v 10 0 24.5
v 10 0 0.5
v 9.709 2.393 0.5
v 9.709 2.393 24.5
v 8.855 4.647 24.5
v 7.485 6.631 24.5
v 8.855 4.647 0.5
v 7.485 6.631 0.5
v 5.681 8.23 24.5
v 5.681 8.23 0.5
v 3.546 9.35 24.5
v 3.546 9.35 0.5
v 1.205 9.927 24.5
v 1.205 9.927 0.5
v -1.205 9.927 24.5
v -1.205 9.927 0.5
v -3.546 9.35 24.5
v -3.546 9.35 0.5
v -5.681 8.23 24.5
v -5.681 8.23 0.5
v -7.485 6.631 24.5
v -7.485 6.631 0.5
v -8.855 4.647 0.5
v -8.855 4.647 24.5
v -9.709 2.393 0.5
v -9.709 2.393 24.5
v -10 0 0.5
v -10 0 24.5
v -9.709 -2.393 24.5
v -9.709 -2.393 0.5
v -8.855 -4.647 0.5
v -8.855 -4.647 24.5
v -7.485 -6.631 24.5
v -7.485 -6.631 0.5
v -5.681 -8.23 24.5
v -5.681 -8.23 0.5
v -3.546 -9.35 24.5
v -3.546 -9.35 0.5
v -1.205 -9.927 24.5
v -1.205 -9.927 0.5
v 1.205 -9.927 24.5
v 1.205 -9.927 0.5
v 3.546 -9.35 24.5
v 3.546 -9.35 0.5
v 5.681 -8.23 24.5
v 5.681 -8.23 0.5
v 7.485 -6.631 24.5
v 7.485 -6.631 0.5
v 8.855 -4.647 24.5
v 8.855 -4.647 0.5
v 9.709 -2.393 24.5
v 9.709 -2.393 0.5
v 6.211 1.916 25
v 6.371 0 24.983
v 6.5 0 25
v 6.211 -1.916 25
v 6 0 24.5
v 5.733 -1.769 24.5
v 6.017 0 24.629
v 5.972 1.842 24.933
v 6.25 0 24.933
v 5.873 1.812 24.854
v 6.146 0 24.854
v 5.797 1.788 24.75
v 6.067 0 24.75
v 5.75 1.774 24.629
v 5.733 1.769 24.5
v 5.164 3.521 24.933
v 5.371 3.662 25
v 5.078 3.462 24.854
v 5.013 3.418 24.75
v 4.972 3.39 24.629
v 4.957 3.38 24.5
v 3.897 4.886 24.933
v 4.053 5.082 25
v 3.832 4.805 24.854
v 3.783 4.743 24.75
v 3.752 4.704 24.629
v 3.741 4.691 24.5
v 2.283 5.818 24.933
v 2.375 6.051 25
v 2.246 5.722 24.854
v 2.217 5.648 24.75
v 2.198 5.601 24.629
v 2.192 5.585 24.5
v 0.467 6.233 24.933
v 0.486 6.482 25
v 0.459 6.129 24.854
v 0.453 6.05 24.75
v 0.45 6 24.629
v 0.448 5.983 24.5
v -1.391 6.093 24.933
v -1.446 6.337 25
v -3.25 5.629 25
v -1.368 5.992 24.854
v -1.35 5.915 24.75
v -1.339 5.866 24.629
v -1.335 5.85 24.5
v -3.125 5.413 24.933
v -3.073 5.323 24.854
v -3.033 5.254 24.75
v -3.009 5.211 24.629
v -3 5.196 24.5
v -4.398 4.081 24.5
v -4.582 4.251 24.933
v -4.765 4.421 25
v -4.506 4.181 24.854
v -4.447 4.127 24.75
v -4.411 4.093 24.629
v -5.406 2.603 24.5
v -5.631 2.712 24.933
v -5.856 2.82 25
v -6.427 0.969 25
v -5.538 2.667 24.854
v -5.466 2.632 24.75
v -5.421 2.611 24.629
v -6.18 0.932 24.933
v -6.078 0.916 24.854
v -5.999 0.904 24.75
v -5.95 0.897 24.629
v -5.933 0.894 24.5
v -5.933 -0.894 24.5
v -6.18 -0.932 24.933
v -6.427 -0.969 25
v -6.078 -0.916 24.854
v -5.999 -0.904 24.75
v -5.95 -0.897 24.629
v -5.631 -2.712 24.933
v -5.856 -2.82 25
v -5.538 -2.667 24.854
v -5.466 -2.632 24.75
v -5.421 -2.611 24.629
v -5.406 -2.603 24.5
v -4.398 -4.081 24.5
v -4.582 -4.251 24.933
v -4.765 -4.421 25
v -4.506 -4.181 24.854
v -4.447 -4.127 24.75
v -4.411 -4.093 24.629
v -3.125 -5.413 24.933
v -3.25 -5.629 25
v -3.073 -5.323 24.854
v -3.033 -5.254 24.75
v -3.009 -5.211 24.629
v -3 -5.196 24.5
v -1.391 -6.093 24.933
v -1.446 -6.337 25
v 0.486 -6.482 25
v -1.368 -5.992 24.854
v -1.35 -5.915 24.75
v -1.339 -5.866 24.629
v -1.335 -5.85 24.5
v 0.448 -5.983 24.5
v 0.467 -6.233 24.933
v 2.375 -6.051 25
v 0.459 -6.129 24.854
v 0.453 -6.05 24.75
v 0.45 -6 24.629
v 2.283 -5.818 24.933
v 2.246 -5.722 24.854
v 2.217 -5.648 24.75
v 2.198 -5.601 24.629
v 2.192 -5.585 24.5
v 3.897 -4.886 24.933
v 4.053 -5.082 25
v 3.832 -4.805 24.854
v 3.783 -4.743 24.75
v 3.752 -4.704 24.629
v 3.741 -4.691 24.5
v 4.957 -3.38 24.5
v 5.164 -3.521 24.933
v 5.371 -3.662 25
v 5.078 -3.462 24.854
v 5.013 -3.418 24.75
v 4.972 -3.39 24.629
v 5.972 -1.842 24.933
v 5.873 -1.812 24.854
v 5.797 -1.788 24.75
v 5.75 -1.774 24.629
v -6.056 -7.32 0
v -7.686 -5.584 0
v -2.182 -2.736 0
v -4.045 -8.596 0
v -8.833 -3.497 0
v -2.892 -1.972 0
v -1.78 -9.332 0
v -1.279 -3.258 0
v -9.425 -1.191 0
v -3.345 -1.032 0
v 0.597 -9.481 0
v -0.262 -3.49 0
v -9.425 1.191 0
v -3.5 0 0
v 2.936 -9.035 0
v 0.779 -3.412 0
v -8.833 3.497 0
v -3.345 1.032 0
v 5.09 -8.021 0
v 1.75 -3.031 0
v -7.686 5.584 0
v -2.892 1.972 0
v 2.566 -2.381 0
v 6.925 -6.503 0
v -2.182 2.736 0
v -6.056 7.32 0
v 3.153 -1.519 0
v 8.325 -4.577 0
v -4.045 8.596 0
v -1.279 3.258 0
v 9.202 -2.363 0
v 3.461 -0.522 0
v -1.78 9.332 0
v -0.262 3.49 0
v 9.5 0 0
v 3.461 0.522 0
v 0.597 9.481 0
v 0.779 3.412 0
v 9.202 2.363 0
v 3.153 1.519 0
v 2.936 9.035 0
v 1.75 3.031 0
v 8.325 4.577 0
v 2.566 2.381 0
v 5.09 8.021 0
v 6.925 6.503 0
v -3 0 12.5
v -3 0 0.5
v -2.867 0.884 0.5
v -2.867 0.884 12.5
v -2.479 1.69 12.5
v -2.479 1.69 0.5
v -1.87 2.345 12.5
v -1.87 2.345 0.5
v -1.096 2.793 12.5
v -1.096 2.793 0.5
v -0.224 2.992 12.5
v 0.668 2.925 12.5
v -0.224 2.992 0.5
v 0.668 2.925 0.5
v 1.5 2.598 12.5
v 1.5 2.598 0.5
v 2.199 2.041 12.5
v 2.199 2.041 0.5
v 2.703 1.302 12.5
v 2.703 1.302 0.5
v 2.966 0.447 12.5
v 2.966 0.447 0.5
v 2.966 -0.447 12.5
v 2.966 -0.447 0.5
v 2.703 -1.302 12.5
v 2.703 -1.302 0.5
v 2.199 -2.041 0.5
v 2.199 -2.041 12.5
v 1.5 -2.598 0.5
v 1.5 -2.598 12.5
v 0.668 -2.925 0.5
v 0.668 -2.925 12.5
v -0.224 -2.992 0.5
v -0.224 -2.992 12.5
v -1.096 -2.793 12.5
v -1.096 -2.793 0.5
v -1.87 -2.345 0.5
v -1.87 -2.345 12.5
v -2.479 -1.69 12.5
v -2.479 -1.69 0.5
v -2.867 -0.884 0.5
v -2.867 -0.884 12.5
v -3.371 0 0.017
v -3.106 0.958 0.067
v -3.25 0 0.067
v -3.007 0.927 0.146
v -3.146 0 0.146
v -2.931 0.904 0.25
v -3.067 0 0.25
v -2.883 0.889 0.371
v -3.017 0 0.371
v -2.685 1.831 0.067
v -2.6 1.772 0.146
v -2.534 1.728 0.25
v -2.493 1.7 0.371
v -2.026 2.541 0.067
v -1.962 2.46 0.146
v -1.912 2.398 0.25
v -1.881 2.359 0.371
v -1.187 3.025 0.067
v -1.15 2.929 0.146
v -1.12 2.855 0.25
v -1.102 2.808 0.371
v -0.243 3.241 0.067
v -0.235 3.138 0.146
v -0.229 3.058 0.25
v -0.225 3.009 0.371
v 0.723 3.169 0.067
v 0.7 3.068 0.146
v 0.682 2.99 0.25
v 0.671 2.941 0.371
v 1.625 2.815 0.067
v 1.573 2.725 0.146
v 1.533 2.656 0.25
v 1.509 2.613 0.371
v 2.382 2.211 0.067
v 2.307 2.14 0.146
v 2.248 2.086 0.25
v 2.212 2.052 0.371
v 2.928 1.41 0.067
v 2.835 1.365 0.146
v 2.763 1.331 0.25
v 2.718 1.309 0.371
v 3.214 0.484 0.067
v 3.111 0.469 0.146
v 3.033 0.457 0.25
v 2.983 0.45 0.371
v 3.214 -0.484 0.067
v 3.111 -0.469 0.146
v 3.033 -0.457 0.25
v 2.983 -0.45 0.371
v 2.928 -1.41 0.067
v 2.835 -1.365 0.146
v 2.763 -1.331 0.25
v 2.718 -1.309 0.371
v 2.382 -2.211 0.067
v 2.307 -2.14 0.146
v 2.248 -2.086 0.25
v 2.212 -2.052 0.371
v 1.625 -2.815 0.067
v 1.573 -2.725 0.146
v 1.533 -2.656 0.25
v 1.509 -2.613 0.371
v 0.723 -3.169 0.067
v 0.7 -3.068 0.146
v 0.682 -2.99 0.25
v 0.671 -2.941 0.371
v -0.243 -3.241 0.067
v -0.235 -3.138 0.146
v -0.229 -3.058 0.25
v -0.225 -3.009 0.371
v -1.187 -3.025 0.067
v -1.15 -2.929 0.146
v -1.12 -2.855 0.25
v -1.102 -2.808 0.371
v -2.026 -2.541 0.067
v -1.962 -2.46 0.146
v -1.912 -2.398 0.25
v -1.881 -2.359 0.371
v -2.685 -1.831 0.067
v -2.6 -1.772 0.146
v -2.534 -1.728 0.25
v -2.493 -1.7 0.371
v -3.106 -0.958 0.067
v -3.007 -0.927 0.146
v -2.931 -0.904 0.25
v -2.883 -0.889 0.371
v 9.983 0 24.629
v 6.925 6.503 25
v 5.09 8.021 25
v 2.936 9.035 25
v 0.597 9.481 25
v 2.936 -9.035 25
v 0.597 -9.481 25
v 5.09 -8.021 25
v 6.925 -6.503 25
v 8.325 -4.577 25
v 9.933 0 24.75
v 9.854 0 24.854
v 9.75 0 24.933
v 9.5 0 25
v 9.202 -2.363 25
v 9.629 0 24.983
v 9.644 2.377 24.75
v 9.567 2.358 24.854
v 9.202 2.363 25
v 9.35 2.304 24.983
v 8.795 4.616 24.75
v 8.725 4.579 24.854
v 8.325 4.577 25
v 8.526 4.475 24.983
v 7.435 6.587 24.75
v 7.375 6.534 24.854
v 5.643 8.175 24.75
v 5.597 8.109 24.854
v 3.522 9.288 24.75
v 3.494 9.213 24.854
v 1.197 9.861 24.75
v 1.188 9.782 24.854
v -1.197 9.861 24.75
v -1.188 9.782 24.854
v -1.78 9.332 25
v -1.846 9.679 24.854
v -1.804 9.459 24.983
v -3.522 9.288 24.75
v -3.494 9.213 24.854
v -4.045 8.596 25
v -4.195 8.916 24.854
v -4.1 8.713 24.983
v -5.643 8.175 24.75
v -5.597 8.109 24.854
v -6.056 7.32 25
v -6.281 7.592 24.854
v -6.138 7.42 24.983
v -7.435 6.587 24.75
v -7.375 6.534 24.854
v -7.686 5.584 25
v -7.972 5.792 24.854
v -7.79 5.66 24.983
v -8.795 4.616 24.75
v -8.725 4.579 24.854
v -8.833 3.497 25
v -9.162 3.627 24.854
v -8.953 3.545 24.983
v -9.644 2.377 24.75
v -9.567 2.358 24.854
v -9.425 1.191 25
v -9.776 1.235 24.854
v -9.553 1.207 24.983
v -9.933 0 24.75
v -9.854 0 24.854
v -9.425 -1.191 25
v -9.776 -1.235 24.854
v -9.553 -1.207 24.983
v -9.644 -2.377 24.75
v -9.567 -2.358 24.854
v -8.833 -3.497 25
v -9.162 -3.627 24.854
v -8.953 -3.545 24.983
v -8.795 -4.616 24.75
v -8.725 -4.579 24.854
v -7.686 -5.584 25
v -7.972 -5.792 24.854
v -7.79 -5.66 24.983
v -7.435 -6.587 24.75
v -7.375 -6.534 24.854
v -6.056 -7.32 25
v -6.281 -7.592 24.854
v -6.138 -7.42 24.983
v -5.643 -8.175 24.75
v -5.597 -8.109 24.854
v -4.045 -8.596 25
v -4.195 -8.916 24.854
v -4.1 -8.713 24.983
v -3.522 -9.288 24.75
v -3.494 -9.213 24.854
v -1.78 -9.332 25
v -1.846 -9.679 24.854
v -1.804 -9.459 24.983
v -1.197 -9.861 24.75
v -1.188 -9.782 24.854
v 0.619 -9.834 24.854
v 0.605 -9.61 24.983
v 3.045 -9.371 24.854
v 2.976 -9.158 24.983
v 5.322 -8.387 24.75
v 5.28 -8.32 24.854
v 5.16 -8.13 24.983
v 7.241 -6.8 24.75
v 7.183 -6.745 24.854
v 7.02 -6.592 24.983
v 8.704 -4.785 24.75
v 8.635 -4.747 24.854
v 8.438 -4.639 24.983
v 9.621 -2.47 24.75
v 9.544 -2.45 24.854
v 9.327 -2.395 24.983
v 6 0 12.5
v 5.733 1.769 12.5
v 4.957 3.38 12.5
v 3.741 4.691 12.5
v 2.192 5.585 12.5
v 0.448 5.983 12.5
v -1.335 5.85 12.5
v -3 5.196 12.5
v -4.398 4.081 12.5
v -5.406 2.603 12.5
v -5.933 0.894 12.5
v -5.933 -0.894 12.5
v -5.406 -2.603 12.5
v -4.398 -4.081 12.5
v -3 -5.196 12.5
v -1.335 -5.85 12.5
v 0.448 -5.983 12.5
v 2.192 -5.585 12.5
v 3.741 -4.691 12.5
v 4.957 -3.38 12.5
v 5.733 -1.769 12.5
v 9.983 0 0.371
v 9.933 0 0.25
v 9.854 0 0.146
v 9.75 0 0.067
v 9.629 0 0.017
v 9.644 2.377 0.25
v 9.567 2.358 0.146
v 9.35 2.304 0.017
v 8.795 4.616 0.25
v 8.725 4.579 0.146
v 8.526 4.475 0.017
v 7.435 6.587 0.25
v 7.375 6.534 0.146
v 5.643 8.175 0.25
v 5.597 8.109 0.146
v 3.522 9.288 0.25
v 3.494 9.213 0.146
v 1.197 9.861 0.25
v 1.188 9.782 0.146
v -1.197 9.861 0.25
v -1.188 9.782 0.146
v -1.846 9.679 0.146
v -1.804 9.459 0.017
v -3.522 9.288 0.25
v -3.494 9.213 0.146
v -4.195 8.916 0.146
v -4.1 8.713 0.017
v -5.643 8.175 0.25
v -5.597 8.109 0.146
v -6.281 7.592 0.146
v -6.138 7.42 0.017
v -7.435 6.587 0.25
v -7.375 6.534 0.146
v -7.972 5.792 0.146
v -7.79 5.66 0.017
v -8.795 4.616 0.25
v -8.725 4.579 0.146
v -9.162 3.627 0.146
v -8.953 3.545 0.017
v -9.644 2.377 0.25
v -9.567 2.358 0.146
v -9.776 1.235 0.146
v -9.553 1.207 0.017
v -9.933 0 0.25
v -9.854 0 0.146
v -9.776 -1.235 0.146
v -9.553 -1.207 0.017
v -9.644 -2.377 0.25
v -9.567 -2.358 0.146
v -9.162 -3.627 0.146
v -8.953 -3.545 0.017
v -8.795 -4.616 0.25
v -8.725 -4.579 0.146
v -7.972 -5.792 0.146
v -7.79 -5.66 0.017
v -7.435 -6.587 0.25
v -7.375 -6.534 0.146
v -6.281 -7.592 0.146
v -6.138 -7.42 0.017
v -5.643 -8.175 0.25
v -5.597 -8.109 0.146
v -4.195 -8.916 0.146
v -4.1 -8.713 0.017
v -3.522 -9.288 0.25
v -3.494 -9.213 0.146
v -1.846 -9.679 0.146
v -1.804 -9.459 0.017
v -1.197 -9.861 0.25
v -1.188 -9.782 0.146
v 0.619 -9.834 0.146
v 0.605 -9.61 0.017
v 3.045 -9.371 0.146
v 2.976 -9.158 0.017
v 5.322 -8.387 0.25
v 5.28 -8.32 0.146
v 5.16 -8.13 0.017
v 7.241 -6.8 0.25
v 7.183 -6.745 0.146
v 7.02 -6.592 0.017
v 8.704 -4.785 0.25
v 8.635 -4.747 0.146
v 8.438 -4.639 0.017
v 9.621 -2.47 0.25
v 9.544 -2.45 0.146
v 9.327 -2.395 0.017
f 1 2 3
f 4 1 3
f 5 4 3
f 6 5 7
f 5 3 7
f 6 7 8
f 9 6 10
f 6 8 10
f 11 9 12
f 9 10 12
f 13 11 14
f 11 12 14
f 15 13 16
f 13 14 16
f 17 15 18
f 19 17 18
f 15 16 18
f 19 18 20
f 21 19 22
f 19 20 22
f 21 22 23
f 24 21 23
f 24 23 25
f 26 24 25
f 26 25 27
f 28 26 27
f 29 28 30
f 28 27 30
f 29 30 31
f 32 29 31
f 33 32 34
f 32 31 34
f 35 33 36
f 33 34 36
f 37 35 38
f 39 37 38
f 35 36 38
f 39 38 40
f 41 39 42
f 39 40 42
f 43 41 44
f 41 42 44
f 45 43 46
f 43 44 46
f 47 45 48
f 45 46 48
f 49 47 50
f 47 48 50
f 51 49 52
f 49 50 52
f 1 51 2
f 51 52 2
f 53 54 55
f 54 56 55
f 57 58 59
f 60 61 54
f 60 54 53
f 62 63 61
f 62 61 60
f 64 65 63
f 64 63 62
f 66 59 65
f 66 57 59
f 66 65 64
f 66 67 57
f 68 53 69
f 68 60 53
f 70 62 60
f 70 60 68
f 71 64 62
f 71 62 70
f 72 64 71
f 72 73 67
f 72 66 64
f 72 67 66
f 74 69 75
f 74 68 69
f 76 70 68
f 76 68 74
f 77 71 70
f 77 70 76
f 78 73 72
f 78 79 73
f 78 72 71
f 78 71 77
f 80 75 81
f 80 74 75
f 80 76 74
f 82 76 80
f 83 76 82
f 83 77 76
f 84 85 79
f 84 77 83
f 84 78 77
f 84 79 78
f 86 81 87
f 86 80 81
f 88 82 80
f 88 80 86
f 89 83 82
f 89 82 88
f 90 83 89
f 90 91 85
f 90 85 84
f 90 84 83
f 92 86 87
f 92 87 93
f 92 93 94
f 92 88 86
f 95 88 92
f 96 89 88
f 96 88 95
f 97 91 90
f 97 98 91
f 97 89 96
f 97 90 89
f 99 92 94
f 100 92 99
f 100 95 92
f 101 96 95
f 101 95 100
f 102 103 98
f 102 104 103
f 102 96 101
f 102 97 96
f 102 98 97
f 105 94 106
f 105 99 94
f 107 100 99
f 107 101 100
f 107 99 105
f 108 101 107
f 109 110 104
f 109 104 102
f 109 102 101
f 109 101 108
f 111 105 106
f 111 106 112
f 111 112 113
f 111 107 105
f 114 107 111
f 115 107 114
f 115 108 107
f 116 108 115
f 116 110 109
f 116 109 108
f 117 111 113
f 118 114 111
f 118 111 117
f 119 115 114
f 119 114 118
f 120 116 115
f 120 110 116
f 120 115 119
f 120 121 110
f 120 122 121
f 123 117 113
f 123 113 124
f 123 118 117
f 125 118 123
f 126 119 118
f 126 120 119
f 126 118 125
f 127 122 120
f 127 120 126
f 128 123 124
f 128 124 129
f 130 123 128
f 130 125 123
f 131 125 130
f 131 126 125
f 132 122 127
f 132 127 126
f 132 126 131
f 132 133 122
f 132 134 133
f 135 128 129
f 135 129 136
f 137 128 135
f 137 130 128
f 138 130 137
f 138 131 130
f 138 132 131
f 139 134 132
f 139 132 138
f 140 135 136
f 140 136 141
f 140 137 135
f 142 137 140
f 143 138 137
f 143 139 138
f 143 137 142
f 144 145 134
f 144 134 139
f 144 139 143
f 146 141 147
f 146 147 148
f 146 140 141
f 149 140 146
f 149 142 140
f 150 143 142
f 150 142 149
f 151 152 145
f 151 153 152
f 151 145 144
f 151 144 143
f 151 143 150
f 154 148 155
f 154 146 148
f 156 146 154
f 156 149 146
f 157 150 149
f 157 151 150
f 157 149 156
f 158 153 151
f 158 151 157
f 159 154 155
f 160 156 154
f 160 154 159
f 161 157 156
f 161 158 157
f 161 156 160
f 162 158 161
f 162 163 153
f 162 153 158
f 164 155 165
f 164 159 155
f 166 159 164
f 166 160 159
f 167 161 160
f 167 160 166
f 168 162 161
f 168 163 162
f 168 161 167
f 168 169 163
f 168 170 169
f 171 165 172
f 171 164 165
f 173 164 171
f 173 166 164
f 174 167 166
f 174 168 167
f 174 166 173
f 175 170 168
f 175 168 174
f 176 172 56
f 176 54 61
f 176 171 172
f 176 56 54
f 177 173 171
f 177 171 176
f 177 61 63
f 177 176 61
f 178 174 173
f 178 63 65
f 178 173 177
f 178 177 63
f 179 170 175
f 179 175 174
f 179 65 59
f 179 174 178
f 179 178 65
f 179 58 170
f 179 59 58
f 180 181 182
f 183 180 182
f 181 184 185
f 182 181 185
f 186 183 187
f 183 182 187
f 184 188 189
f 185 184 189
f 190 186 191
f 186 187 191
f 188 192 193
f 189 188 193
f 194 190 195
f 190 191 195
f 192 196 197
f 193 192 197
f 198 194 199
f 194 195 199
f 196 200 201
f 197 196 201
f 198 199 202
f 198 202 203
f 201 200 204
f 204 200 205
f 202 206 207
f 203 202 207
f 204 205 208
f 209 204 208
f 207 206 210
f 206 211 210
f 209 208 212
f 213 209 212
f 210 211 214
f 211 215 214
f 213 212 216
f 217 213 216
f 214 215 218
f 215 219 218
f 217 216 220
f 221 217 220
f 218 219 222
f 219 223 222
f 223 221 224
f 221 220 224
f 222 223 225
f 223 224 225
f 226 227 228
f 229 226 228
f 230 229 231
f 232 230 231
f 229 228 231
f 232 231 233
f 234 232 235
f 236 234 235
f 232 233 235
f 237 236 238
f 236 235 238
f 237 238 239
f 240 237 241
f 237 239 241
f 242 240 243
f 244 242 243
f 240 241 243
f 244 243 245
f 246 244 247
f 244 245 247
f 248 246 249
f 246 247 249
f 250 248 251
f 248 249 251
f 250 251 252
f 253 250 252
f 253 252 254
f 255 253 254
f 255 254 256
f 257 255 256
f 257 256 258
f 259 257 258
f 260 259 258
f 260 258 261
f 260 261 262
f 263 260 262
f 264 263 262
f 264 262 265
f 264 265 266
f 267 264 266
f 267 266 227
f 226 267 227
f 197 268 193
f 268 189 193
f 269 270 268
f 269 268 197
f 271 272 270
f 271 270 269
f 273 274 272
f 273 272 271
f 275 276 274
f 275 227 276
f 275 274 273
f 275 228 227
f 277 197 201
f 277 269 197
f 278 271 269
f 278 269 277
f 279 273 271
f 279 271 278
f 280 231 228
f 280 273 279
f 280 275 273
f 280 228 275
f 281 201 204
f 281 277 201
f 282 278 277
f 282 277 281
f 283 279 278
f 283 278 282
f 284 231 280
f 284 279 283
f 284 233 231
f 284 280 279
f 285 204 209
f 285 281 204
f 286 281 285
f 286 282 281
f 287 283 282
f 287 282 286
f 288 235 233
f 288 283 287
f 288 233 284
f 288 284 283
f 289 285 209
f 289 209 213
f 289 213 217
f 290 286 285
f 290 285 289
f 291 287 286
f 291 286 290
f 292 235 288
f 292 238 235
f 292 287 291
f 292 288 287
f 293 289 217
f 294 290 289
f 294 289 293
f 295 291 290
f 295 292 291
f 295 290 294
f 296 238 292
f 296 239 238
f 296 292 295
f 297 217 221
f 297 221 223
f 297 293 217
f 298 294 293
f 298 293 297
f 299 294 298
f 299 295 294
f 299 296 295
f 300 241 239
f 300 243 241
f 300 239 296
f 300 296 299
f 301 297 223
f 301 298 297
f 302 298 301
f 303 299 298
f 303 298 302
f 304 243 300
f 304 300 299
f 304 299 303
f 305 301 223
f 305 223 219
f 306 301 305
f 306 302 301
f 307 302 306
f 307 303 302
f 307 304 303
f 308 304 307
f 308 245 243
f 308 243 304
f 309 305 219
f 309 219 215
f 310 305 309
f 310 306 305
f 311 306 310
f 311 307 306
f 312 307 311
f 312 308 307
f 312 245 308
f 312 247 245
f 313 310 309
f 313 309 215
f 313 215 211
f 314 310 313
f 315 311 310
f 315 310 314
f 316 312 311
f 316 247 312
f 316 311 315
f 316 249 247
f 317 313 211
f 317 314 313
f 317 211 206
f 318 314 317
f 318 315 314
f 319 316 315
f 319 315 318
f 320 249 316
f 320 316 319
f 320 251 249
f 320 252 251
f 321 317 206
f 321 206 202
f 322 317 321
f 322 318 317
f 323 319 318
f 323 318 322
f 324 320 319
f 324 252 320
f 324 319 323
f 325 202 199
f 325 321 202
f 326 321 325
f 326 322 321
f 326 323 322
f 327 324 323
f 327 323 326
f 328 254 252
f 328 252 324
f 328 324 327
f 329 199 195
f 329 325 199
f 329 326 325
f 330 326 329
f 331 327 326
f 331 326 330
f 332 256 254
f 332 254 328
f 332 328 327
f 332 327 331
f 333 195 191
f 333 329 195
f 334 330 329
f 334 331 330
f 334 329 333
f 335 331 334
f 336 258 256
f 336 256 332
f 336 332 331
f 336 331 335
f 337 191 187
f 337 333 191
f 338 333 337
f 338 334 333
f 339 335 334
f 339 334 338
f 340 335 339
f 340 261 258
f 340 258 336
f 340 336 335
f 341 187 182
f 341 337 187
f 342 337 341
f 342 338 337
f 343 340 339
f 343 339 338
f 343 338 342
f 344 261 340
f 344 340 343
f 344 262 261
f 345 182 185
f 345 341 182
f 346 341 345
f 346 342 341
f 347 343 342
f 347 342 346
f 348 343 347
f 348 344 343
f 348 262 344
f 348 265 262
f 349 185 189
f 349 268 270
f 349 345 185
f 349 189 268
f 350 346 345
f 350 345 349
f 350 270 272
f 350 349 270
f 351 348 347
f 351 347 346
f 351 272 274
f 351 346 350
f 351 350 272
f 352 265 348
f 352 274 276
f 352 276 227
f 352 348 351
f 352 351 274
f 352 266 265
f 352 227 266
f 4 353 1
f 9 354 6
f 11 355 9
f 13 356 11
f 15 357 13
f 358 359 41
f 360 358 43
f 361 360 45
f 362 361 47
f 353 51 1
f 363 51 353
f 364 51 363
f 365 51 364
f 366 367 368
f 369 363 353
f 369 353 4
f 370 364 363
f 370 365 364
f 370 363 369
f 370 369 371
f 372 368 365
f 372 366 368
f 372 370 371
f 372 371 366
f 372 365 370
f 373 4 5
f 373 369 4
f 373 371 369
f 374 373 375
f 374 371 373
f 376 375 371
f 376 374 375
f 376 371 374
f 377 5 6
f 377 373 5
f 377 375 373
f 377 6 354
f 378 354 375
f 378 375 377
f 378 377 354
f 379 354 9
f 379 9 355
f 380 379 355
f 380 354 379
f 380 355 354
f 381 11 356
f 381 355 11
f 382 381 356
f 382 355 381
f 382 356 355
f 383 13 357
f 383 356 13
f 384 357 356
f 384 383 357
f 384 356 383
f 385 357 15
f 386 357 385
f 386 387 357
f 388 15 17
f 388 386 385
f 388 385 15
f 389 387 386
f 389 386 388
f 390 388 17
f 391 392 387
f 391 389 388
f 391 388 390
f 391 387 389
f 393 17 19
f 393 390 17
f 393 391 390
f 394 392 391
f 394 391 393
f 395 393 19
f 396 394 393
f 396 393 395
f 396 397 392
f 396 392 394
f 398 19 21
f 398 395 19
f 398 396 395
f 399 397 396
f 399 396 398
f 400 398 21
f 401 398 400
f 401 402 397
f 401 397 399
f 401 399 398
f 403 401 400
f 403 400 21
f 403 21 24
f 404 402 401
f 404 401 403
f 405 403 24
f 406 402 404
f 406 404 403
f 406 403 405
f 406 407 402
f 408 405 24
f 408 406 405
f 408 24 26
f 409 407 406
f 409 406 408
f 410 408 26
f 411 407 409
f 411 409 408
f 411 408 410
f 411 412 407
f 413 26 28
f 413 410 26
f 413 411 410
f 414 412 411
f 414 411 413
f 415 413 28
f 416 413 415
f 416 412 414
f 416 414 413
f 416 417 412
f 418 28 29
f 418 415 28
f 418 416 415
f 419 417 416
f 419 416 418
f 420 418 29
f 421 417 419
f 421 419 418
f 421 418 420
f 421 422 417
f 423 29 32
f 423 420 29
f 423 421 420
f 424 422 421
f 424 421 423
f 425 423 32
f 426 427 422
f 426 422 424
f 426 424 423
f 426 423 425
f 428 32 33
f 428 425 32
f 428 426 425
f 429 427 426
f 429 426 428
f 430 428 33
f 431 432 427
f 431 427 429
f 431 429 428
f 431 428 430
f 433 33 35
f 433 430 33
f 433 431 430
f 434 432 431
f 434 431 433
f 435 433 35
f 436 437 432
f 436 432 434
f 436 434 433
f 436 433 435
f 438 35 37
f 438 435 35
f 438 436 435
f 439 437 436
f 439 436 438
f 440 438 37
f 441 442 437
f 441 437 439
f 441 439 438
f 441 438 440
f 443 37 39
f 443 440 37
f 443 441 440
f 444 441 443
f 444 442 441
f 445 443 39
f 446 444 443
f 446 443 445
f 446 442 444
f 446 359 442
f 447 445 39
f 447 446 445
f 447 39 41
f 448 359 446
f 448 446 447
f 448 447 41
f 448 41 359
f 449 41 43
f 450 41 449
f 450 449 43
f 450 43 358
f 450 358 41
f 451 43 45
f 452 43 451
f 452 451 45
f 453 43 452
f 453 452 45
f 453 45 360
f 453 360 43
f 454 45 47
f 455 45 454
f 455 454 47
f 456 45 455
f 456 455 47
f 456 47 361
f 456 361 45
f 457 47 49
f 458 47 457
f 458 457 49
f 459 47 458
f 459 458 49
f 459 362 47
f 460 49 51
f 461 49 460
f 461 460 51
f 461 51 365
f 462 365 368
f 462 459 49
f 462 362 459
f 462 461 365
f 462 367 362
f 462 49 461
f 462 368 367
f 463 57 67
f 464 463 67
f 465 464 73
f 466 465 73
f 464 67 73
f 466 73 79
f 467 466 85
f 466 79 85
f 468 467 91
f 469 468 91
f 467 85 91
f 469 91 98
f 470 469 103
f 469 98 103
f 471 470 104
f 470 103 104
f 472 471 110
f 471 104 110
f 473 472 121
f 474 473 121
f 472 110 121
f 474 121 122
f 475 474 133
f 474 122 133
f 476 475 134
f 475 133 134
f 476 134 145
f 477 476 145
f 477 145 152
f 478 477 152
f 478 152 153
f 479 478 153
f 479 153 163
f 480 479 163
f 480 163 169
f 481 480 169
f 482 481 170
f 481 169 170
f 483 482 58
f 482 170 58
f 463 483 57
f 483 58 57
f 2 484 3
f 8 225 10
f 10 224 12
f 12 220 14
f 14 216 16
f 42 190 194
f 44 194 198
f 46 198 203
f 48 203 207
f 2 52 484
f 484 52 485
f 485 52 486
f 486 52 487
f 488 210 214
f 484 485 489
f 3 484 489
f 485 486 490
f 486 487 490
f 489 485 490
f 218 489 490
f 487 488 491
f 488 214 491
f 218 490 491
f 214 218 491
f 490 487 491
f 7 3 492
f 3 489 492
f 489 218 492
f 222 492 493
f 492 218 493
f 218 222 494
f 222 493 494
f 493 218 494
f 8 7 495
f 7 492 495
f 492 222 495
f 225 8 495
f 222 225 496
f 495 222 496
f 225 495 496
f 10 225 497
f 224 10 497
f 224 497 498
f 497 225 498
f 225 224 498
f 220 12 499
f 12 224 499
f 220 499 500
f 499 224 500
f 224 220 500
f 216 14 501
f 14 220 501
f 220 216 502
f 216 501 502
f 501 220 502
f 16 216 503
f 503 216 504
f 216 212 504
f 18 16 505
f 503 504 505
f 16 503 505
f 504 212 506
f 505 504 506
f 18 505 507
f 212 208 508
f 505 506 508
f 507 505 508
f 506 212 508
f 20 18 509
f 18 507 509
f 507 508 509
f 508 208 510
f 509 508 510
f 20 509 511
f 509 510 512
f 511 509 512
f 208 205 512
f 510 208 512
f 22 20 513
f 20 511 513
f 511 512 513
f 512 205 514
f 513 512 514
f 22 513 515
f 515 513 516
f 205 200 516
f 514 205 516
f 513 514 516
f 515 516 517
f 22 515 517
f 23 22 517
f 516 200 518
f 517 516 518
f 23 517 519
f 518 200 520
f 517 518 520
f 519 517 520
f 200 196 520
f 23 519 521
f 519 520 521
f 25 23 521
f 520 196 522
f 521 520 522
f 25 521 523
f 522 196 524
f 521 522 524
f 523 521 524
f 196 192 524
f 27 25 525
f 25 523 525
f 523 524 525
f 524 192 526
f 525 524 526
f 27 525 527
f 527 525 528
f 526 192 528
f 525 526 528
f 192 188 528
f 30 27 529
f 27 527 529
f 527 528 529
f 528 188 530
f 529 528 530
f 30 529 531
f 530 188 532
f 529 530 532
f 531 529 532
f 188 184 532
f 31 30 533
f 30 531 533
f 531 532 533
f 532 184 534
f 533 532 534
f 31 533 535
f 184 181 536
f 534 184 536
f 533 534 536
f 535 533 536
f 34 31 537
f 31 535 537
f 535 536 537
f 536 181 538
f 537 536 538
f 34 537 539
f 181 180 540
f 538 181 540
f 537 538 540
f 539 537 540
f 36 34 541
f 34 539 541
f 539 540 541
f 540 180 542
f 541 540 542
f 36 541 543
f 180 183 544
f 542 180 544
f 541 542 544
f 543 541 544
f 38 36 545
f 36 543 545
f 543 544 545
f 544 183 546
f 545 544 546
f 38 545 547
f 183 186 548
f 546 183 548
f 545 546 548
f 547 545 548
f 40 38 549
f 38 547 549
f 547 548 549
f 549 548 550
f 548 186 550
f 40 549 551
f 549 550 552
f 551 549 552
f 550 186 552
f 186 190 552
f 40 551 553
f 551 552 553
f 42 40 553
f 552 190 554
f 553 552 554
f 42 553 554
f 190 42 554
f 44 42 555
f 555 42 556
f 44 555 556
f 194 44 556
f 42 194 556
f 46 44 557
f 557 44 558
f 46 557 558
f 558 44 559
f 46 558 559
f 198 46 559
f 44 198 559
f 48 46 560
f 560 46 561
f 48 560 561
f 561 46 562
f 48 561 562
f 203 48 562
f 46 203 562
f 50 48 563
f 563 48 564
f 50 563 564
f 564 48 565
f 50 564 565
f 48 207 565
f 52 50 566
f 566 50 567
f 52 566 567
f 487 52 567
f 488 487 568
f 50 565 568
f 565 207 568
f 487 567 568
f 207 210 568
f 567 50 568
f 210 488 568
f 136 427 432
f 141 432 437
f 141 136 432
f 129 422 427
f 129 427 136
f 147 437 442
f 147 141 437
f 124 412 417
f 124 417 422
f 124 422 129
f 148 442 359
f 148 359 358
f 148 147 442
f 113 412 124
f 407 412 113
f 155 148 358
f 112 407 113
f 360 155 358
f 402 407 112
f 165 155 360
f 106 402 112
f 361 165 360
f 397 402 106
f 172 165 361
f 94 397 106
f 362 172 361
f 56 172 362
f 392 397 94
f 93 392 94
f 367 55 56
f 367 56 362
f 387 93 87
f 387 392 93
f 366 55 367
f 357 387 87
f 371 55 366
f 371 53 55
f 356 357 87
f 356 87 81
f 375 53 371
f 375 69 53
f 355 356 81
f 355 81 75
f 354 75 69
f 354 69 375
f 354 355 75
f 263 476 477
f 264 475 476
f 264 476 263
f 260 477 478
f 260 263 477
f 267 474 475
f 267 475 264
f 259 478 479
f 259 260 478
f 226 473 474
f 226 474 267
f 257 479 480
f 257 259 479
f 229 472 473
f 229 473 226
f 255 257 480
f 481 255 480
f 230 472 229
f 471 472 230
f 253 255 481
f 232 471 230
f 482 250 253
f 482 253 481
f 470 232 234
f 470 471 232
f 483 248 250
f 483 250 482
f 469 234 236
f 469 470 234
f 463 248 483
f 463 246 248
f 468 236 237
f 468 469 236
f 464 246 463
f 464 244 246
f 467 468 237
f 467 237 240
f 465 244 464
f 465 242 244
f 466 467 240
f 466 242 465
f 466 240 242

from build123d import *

# Parameters (mm, degrees)
SKETCH_1_R          = 10
EXTRUDE_1_DEPTH     = 25
SKETCH_2_R          = 6
CUT_EXTRUDE_1_DEPTH = 12.5
SKETCH_3_R          = 3
CUT_EXTRUDE_2_DEPTH = 15
FILLET_1_R          = 0.5


with BuildPart() as part:
    # 草图1 → 凸台-拉伸1 (new body)
    with BuildSketch(Plane.XY):
        Circle(SKETCH_1_R)
    extrude(amount=EXTRUDE_1_DEPTH)

    # 草图2 → 切除-拉伸1 (cut)
    with BuildSketch(Plane.XY.offset(25)):
        Circle(SKETCH_2_R)
    extrude(amount=-CUT_EXTRUDE_1_DEPTH, mode=Mode.SUBTRACT)

    # 草图3 → 切除-拉伸2 (cut)
    with BuildSketch(Plane(origin=(0, 0, 0), x_dir=(-1, 0, 0), z_dir=(0, 0, -1))):
        Circle(SKETCH_3_R)
    extrude(amount=-CUT_EXTRUDE_2_DEPTH, mode=Mode.SUBTRACT)

    # 圆角1
    fillet_1_edges = [part.edges().sort_by_distance(p)[0] for p in [
        (3, 0, 0),
        (-10, 0, 0),
        (-10, 0, 25),
        (-6, 0, 25),
    ]]
    fillet(fillet_1_edges, radius=FILLET_1_R)


solid = part.part
